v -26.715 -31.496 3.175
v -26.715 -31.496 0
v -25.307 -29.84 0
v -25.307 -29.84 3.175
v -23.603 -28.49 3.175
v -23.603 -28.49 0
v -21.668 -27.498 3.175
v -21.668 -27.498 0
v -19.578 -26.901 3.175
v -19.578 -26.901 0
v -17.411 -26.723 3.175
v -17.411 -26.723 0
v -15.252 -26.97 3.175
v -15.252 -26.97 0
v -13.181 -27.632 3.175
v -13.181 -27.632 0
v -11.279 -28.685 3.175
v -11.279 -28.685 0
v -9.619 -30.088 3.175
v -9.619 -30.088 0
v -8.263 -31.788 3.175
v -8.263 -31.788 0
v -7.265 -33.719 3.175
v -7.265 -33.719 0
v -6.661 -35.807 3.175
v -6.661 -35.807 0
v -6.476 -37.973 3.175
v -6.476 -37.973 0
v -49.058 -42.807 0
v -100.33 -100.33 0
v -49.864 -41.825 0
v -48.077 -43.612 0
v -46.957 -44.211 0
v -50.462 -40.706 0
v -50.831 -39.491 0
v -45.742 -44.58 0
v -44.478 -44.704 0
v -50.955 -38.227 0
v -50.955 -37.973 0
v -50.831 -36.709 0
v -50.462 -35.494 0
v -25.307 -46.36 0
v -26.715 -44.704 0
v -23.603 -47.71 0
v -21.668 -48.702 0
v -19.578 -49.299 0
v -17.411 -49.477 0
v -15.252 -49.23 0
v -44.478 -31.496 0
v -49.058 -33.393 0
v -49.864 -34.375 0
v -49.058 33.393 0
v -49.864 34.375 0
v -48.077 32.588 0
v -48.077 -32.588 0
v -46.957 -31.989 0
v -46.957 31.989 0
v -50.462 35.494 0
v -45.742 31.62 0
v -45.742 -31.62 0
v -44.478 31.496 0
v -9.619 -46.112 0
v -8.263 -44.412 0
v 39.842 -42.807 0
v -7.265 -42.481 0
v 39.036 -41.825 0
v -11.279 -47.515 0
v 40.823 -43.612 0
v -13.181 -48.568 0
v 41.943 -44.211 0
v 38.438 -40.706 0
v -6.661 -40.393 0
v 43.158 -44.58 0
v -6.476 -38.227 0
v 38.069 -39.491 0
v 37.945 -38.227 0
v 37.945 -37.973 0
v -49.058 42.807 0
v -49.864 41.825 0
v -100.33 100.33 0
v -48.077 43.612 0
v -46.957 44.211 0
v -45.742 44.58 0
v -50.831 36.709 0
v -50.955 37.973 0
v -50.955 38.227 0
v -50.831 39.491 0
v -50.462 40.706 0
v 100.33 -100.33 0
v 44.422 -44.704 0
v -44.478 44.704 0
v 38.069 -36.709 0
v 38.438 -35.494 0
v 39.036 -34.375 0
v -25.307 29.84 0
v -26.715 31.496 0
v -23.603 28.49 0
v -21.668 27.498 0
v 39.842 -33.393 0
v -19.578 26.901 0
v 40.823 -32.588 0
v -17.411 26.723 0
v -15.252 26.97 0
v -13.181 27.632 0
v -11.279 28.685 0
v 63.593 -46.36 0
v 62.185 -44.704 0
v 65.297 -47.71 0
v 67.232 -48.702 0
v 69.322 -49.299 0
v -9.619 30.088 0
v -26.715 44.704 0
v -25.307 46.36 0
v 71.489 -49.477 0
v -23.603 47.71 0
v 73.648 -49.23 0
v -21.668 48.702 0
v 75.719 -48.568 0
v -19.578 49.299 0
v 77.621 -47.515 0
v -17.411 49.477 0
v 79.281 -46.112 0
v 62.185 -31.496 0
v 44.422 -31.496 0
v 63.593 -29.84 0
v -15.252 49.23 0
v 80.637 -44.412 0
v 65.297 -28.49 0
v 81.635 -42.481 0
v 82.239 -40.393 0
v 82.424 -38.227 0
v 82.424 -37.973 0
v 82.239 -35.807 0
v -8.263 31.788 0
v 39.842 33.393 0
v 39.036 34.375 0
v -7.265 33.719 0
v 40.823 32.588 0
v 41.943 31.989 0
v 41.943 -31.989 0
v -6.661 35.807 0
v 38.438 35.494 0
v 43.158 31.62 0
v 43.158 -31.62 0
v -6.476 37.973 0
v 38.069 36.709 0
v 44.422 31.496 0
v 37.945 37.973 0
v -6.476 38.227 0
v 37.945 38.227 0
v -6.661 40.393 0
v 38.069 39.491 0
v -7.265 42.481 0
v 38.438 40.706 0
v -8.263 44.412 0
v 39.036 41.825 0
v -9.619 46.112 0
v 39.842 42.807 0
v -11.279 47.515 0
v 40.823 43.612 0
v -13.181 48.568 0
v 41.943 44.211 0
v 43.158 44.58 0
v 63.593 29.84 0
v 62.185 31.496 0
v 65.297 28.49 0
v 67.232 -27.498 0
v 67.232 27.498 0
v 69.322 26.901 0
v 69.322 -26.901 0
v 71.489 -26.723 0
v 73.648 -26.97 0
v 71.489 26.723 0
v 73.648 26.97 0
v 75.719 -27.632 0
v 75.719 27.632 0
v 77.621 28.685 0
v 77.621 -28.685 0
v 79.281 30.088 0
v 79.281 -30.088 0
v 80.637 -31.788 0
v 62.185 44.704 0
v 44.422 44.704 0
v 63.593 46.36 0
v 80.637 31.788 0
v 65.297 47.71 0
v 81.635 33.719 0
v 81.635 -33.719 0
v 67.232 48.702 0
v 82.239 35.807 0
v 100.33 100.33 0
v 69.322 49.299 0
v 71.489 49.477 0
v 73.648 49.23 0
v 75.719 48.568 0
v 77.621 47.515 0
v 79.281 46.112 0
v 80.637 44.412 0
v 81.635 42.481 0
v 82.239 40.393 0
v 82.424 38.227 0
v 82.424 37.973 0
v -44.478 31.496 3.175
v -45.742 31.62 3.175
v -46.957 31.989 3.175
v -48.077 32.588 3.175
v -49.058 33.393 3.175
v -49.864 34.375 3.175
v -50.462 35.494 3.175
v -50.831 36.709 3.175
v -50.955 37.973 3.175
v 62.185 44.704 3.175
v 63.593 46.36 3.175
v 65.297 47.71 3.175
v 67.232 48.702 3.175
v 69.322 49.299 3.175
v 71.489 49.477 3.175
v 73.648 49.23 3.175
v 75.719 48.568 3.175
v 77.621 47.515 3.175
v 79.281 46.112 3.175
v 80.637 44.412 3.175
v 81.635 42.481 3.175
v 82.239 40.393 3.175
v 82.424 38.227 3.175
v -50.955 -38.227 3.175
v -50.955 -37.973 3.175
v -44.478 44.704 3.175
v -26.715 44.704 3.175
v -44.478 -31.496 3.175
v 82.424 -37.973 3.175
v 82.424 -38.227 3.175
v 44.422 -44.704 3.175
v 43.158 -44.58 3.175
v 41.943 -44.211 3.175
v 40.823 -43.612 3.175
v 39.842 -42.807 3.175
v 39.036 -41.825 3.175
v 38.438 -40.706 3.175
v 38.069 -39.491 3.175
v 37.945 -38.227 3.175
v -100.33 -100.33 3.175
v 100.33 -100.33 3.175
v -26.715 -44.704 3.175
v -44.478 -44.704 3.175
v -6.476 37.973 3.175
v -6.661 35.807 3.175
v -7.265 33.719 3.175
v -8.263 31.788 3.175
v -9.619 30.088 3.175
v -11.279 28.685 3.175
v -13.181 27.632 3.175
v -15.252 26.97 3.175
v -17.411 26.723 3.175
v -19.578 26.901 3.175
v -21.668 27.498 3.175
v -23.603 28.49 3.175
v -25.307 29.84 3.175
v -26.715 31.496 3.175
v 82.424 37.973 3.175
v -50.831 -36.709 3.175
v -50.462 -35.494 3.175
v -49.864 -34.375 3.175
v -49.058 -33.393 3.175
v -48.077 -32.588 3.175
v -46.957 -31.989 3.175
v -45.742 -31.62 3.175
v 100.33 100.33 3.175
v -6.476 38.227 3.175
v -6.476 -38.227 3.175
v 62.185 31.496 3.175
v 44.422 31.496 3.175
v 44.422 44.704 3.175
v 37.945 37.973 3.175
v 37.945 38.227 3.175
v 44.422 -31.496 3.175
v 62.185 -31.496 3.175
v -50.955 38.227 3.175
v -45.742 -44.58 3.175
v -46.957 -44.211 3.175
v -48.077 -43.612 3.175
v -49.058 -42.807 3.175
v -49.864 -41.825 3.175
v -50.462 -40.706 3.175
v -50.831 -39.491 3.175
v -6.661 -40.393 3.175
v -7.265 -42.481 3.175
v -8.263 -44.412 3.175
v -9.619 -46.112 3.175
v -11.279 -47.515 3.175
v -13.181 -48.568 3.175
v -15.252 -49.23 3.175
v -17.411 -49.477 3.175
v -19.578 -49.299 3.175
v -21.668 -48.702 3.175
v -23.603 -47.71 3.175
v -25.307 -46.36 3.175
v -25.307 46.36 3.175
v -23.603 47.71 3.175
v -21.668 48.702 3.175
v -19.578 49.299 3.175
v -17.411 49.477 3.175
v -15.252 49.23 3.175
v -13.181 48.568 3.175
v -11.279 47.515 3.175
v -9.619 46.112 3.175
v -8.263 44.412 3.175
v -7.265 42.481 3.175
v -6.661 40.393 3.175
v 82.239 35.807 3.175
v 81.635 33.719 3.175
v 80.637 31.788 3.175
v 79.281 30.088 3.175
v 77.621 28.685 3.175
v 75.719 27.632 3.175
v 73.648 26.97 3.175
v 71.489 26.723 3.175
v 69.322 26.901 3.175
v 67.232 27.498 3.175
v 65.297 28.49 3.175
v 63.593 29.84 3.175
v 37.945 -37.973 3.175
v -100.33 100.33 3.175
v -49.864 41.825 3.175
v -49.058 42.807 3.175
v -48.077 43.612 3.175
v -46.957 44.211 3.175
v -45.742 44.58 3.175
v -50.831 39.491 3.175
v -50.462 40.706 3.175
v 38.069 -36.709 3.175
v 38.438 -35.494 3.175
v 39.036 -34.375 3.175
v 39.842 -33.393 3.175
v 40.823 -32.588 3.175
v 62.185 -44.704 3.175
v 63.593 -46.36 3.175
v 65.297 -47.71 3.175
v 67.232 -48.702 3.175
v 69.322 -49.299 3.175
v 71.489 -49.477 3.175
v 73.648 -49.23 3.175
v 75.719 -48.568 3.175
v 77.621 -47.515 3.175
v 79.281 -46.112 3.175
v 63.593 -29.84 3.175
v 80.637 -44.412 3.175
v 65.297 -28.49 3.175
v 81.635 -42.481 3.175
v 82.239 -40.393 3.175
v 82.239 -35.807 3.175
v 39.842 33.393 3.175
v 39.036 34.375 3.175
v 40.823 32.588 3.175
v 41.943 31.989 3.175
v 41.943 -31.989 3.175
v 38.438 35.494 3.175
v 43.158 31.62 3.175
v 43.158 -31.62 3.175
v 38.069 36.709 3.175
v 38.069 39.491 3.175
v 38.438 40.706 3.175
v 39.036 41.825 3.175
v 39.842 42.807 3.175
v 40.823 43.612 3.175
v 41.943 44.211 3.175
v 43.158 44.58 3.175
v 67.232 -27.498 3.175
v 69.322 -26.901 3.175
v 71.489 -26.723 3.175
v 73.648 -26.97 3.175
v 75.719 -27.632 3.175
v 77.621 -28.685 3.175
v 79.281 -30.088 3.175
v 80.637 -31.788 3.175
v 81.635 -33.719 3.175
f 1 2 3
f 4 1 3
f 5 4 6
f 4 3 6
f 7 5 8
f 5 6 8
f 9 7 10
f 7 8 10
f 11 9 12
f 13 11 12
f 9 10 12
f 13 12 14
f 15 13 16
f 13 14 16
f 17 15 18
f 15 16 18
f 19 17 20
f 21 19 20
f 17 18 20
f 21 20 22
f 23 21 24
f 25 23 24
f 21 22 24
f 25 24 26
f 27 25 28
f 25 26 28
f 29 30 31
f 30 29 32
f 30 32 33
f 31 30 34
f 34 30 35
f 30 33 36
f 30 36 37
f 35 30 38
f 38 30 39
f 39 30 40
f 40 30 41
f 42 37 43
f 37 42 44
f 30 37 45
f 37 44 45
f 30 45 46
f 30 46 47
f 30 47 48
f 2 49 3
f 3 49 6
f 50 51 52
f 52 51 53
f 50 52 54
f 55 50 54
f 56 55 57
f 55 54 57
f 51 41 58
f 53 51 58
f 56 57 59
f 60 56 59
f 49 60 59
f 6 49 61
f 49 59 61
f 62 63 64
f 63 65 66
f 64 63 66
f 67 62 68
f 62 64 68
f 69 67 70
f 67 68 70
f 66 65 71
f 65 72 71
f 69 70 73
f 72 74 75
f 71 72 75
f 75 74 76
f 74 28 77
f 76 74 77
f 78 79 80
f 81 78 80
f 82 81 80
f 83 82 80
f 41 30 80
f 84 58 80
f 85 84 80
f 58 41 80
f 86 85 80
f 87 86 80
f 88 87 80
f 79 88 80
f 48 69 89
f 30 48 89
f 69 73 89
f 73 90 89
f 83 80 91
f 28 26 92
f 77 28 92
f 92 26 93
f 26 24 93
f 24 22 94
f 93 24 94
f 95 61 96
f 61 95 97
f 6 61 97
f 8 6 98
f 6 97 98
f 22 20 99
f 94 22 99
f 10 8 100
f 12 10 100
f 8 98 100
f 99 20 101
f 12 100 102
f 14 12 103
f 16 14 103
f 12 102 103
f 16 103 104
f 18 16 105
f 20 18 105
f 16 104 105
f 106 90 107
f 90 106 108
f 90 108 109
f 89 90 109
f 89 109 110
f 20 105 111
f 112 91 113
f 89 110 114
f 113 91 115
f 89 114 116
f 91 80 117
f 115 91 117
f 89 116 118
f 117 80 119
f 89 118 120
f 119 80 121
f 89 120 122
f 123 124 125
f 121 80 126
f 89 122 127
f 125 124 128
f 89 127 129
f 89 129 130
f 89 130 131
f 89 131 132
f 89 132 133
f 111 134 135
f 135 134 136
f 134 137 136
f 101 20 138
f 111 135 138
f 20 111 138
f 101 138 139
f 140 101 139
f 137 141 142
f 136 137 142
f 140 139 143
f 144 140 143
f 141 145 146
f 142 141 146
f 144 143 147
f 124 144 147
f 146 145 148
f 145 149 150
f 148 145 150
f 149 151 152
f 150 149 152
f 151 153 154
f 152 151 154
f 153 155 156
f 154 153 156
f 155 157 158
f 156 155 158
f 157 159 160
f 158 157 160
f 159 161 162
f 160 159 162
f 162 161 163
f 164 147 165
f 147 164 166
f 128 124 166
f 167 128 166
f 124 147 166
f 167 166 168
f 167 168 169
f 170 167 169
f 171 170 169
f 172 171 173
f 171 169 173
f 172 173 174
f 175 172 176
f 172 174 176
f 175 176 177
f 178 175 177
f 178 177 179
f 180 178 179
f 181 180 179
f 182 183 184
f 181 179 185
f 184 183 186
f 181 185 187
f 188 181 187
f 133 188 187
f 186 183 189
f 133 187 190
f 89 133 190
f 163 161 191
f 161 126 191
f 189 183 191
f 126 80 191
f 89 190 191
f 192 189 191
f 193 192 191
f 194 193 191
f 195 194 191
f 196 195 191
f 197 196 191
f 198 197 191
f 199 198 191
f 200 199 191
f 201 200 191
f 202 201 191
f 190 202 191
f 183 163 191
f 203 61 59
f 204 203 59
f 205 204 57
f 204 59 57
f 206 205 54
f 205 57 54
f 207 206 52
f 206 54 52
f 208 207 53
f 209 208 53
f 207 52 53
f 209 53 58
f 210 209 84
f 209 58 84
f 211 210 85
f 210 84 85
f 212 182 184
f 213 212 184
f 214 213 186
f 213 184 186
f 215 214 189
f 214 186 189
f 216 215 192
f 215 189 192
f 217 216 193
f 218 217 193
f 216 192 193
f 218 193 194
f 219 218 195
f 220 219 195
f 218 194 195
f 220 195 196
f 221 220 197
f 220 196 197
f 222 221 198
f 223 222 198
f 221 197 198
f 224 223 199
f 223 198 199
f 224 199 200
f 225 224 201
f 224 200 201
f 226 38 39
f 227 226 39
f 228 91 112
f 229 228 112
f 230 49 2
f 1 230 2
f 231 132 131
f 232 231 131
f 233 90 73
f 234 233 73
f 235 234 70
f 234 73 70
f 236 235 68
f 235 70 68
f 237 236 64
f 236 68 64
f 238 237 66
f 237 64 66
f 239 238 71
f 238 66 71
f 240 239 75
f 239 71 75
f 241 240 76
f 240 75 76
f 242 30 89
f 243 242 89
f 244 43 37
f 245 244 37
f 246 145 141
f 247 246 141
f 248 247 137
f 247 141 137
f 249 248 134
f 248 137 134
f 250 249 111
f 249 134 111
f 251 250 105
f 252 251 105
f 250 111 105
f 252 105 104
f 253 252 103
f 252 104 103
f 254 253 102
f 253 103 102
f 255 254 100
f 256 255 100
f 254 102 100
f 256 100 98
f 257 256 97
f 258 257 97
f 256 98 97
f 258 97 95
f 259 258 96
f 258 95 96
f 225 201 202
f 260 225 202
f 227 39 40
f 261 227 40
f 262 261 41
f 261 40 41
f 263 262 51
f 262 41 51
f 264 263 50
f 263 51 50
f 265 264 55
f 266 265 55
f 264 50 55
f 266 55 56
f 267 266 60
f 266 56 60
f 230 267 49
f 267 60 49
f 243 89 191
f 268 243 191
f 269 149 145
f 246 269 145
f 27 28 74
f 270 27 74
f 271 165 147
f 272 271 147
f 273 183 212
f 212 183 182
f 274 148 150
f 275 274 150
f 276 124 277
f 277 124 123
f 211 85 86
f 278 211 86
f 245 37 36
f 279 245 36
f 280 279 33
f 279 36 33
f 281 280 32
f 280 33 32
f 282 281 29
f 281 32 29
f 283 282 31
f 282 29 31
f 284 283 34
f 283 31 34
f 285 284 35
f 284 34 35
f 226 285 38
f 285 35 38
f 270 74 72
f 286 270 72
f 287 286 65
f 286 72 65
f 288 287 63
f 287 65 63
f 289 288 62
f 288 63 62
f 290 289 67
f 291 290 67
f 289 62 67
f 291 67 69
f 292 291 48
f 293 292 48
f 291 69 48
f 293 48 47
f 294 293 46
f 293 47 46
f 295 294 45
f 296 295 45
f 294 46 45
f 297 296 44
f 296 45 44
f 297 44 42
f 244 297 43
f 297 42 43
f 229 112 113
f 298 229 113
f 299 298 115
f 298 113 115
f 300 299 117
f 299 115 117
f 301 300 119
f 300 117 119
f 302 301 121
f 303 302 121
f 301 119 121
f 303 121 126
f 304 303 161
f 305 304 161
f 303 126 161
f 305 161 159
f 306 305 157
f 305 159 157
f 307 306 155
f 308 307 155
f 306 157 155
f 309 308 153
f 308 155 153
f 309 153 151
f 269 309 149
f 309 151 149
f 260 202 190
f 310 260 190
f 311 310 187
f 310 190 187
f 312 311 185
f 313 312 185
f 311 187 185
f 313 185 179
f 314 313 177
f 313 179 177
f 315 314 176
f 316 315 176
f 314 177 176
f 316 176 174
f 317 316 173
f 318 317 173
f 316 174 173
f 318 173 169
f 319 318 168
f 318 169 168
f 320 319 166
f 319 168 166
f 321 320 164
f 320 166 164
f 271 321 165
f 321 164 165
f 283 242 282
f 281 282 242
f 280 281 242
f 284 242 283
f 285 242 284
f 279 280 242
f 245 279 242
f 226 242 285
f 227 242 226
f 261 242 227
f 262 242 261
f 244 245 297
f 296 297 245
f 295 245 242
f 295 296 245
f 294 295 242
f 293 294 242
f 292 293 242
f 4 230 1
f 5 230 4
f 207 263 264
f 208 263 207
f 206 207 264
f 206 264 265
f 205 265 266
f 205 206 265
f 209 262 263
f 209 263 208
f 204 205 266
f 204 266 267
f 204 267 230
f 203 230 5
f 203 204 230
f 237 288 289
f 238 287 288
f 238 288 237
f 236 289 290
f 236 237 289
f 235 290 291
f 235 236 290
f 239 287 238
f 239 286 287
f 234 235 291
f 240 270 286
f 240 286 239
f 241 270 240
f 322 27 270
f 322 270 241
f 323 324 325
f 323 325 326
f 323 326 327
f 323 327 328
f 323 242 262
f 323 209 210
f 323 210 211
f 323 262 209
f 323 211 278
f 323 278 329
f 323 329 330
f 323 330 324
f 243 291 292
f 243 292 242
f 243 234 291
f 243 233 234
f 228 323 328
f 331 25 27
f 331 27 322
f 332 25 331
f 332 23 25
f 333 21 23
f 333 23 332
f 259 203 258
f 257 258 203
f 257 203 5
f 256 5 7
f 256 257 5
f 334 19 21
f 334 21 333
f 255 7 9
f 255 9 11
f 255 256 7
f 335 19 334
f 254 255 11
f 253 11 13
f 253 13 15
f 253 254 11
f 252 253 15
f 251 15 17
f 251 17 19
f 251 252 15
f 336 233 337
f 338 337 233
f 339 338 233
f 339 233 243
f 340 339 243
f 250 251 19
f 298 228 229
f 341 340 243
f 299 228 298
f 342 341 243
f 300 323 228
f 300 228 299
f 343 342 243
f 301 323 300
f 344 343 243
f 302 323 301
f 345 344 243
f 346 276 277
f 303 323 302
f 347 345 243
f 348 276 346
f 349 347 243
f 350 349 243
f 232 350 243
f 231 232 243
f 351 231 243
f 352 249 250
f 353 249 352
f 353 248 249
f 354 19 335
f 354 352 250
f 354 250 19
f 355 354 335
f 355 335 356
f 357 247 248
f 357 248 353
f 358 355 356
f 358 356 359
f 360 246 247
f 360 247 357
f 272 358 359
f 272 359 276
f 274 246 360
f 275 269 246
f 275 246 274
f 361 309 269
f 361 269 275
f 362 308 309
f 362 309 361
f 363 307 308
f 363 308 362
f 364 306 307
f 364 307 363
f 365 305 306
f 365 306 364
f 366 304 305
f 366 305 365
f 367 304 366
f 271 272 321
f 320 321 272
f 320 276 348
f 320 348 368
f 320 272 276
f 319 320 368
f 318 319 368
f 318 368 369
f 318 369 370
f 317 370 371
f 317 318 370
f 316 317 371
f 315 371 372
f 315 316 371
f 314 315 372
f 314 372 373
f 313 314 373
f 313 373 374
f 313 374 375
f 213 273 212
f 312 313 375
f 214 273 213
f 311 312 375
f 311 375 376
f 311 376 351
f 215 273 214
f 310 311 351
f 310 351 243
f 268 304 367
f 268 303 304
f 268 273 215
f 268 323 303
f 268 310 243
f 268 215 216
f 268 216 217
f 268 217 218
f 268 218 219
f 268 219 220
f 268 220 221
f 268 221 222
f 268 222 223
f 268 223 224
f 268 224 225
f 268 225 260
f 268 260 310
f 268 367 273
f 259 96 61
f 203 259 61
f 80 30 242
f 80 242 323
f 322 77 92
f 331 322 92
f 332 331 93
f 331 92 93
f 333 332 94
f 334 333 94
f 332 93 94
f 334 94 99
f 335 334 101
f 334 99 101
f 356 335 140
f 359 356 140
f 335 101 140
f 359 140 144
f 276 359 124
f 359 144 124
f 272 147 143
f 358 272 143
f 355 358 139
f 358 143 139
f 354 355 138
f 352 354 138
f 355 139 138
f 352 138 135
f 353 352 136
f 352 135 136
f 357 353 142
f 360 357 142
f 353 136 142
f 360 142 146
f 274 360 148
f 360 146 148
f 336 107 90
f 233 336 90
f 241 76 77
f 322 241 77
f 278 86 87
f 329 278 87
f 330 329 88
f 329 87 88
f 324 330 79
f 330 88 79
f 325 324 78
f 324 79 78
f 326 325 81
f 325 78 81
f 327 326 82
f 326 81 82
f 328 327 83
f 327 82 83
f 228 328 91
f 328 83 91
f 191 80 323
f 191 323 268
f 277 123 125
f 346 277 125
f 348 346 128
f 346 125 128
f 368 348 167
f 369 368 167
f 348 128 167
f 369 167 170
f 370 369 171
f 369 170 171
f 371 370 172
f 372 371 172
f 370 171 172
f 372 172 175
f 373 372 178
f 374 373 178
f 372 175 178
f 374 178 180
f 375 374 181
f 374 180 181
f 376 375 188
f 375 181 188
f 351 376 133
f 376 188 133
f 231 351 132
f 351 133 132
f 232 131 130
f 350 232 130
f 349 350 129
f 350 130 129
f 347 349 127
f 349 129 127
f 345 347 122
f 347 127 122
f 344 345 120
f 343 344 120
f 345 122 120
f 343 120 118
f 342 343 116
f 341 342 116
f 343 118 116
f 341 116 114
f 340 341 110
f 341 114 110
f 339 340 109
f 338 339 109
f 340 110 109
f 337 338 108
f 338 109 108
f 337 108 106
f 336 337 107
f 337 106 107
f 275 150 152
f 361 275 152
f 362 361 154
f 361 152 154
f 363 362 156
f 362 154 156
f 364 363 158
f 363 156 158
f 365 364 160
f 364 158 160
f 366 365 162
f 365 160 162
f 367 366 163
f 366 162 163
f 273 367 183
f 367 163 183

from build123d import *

# Parameters (mm, degrees)
F0_W     = 200.66
F0_H     = 200.66
F1_DEPTH = 3.175


# Not quite as in the source:
# - a length typed as a fraction of an inch, garbled in the dataset ("3 / 203.2 mm" for 3/8 in), is restored


with BuildPart() as f1:
    # F0 (on Top) → F1 (new body)
    with BuildSketch(Plane.XY):
        Rectangle(F0_W, F0_H)
        with BuildLine():
            Line((-6.4755703305, -37.973), (-6.4755703305, -38.227))
            ThreePointArc((-6.4755703305, -38.227), (-14.2002143688, -48.9498629888), (-26.715108043, -44.704))
            Line((-26.715108043, -44.704), (-30.0367761716, -44.704))
            Line((-30.0367761716, -44.704), (-44.4783061624, -44.704))
            ThreePointArc((-44.4783061624, -44.704), (-49.0582367841, -42.8069306217), (-50.9553061624, -38.227))
            Line((-50.9553061624, -38.227), (-50.9553061624, -37.973))
            ThreePointArc((-50.9553061624, -37.973), (-49.0582367841, -33.3930693783), (-44.4783061624, -31.496))
            Line((-44.4783061624, -31.496), (-30.0367761716, -31.496))
            Line((-30.0367761716, -31.496), (-26.715108043, -31.496))
            ThreePointArc((-26.715108043, -31.496), (-14.2002143688, -27.2501370112), (-6.4755703305, -37.973))
        make_face(mode=Mode.SUBTRACT)
        with BuildLine():
            Line((82.4244296695, -37.973), (82.4244296695, -38.227))
            ThreePointArc((82.4244296695, -38.227), (74.6997856312, -48.9498629888), (62.184891957, -44.704))
            Line((62.184891957, -44.704), (58.8632238284, -44.704))
            Line((58.8632238284, -44.704), (44.4216938376, -44.704))
            ThreePointArc((44.4216938376, -44.704), (39.8417632159, -42.8069306217), (37.9446938376, -38.227))
            Line((37.9446938376, -38.227), (37.9446938376, -37.973))
            ThreePointArc((37.9446938376, -37.973), (39.8417632159, -33.3930693783), (44.4216938376, -31.496))
            Line((44.4216938376, -31.496), (58.8632238284, -31.496))
            Line((58.8632238284, -31.496), (62.184891957, -31.496))
            ThreePointArc((62.184891957, -31.496), (74.6997856312, -27.2501370112), (82.4244296695, -37.973))
        make_face(mode=Mode.SUBTRACT)
        with BuildLine():
            ThreePointArc((-50.9553061624, 38.227), (-49.0582367841, 42.8069306217), (-44.4783061624, 44.704))
            Line((-44.4783061624, 44.704), (-30.0367761716, 44.704))
            Line((-30.0367761716, 44.704), (-26.715108043, 44.704))
            ThreePointArc((-26.715108043, 44.704), (-14.2002143688, 48.9498629888), (-6.4755703305, 38.227))
            Line((-6.4755703305, 38.227), (-6.4755703305, 37.973))
            ThreePointArc((-6.4755703305, 37.973), (-14.2002143688, 27.2501370112), (-26.715108043, 31.496))
            Line((-26.715108043, 31.496), (-30.0367761716, 31.496))
            Line((-30.0367761716, 31.496), (-44.4783061624, 31.496))
            ThreePointArc((-44.4783061624, 31.496), (-49.0582367841, 33.3930693783), (-50.9553061624, 37.973))
            Line((-50.9553061624, 37.973), (-50.9553061624, 38.227))
        make_face(mode=Mode.SUBTRACT)
        with BuildLine():
            Line((82.4244296695, 38.227), (82.4244296695, 37.973))
            ThreePointArc((82.4244296695, 37.973), (74.6997856312, 27.2501370112), (62.184891957, 31.496))
            Line((62.184891957, 31.496), (58.8632238284, 31.496))
            Line((58.8632238284, 31.496), (44.4216938376, 31.496))
            ThreePointArc((44.4216938376, 31.496), (39.8417632159, 33.3930693783), (37.9446938376, 37.973))
            Line((37.9446938376, 37.973), (37.9446938376, 38.227))
            ThreePointArc((37.9446938376, 38.227), (39.8417632159, 42.8069306217), (44.4216938376, 44.704))
            Line((44.4216938376, 44.704), (58.8632238284, 44.704))
            Line((58.8632238284, 44.704), (62.184891957, 44.704))
            ThreePointArc((62.184891957, 44.704), (74.6997856312, 48.9498629888), (82.4244296695, 38.227))
        make_face(mode=Mode.SUBTRACT)
    extrude(amount=F1_DEPTH)


solid = f1.part
